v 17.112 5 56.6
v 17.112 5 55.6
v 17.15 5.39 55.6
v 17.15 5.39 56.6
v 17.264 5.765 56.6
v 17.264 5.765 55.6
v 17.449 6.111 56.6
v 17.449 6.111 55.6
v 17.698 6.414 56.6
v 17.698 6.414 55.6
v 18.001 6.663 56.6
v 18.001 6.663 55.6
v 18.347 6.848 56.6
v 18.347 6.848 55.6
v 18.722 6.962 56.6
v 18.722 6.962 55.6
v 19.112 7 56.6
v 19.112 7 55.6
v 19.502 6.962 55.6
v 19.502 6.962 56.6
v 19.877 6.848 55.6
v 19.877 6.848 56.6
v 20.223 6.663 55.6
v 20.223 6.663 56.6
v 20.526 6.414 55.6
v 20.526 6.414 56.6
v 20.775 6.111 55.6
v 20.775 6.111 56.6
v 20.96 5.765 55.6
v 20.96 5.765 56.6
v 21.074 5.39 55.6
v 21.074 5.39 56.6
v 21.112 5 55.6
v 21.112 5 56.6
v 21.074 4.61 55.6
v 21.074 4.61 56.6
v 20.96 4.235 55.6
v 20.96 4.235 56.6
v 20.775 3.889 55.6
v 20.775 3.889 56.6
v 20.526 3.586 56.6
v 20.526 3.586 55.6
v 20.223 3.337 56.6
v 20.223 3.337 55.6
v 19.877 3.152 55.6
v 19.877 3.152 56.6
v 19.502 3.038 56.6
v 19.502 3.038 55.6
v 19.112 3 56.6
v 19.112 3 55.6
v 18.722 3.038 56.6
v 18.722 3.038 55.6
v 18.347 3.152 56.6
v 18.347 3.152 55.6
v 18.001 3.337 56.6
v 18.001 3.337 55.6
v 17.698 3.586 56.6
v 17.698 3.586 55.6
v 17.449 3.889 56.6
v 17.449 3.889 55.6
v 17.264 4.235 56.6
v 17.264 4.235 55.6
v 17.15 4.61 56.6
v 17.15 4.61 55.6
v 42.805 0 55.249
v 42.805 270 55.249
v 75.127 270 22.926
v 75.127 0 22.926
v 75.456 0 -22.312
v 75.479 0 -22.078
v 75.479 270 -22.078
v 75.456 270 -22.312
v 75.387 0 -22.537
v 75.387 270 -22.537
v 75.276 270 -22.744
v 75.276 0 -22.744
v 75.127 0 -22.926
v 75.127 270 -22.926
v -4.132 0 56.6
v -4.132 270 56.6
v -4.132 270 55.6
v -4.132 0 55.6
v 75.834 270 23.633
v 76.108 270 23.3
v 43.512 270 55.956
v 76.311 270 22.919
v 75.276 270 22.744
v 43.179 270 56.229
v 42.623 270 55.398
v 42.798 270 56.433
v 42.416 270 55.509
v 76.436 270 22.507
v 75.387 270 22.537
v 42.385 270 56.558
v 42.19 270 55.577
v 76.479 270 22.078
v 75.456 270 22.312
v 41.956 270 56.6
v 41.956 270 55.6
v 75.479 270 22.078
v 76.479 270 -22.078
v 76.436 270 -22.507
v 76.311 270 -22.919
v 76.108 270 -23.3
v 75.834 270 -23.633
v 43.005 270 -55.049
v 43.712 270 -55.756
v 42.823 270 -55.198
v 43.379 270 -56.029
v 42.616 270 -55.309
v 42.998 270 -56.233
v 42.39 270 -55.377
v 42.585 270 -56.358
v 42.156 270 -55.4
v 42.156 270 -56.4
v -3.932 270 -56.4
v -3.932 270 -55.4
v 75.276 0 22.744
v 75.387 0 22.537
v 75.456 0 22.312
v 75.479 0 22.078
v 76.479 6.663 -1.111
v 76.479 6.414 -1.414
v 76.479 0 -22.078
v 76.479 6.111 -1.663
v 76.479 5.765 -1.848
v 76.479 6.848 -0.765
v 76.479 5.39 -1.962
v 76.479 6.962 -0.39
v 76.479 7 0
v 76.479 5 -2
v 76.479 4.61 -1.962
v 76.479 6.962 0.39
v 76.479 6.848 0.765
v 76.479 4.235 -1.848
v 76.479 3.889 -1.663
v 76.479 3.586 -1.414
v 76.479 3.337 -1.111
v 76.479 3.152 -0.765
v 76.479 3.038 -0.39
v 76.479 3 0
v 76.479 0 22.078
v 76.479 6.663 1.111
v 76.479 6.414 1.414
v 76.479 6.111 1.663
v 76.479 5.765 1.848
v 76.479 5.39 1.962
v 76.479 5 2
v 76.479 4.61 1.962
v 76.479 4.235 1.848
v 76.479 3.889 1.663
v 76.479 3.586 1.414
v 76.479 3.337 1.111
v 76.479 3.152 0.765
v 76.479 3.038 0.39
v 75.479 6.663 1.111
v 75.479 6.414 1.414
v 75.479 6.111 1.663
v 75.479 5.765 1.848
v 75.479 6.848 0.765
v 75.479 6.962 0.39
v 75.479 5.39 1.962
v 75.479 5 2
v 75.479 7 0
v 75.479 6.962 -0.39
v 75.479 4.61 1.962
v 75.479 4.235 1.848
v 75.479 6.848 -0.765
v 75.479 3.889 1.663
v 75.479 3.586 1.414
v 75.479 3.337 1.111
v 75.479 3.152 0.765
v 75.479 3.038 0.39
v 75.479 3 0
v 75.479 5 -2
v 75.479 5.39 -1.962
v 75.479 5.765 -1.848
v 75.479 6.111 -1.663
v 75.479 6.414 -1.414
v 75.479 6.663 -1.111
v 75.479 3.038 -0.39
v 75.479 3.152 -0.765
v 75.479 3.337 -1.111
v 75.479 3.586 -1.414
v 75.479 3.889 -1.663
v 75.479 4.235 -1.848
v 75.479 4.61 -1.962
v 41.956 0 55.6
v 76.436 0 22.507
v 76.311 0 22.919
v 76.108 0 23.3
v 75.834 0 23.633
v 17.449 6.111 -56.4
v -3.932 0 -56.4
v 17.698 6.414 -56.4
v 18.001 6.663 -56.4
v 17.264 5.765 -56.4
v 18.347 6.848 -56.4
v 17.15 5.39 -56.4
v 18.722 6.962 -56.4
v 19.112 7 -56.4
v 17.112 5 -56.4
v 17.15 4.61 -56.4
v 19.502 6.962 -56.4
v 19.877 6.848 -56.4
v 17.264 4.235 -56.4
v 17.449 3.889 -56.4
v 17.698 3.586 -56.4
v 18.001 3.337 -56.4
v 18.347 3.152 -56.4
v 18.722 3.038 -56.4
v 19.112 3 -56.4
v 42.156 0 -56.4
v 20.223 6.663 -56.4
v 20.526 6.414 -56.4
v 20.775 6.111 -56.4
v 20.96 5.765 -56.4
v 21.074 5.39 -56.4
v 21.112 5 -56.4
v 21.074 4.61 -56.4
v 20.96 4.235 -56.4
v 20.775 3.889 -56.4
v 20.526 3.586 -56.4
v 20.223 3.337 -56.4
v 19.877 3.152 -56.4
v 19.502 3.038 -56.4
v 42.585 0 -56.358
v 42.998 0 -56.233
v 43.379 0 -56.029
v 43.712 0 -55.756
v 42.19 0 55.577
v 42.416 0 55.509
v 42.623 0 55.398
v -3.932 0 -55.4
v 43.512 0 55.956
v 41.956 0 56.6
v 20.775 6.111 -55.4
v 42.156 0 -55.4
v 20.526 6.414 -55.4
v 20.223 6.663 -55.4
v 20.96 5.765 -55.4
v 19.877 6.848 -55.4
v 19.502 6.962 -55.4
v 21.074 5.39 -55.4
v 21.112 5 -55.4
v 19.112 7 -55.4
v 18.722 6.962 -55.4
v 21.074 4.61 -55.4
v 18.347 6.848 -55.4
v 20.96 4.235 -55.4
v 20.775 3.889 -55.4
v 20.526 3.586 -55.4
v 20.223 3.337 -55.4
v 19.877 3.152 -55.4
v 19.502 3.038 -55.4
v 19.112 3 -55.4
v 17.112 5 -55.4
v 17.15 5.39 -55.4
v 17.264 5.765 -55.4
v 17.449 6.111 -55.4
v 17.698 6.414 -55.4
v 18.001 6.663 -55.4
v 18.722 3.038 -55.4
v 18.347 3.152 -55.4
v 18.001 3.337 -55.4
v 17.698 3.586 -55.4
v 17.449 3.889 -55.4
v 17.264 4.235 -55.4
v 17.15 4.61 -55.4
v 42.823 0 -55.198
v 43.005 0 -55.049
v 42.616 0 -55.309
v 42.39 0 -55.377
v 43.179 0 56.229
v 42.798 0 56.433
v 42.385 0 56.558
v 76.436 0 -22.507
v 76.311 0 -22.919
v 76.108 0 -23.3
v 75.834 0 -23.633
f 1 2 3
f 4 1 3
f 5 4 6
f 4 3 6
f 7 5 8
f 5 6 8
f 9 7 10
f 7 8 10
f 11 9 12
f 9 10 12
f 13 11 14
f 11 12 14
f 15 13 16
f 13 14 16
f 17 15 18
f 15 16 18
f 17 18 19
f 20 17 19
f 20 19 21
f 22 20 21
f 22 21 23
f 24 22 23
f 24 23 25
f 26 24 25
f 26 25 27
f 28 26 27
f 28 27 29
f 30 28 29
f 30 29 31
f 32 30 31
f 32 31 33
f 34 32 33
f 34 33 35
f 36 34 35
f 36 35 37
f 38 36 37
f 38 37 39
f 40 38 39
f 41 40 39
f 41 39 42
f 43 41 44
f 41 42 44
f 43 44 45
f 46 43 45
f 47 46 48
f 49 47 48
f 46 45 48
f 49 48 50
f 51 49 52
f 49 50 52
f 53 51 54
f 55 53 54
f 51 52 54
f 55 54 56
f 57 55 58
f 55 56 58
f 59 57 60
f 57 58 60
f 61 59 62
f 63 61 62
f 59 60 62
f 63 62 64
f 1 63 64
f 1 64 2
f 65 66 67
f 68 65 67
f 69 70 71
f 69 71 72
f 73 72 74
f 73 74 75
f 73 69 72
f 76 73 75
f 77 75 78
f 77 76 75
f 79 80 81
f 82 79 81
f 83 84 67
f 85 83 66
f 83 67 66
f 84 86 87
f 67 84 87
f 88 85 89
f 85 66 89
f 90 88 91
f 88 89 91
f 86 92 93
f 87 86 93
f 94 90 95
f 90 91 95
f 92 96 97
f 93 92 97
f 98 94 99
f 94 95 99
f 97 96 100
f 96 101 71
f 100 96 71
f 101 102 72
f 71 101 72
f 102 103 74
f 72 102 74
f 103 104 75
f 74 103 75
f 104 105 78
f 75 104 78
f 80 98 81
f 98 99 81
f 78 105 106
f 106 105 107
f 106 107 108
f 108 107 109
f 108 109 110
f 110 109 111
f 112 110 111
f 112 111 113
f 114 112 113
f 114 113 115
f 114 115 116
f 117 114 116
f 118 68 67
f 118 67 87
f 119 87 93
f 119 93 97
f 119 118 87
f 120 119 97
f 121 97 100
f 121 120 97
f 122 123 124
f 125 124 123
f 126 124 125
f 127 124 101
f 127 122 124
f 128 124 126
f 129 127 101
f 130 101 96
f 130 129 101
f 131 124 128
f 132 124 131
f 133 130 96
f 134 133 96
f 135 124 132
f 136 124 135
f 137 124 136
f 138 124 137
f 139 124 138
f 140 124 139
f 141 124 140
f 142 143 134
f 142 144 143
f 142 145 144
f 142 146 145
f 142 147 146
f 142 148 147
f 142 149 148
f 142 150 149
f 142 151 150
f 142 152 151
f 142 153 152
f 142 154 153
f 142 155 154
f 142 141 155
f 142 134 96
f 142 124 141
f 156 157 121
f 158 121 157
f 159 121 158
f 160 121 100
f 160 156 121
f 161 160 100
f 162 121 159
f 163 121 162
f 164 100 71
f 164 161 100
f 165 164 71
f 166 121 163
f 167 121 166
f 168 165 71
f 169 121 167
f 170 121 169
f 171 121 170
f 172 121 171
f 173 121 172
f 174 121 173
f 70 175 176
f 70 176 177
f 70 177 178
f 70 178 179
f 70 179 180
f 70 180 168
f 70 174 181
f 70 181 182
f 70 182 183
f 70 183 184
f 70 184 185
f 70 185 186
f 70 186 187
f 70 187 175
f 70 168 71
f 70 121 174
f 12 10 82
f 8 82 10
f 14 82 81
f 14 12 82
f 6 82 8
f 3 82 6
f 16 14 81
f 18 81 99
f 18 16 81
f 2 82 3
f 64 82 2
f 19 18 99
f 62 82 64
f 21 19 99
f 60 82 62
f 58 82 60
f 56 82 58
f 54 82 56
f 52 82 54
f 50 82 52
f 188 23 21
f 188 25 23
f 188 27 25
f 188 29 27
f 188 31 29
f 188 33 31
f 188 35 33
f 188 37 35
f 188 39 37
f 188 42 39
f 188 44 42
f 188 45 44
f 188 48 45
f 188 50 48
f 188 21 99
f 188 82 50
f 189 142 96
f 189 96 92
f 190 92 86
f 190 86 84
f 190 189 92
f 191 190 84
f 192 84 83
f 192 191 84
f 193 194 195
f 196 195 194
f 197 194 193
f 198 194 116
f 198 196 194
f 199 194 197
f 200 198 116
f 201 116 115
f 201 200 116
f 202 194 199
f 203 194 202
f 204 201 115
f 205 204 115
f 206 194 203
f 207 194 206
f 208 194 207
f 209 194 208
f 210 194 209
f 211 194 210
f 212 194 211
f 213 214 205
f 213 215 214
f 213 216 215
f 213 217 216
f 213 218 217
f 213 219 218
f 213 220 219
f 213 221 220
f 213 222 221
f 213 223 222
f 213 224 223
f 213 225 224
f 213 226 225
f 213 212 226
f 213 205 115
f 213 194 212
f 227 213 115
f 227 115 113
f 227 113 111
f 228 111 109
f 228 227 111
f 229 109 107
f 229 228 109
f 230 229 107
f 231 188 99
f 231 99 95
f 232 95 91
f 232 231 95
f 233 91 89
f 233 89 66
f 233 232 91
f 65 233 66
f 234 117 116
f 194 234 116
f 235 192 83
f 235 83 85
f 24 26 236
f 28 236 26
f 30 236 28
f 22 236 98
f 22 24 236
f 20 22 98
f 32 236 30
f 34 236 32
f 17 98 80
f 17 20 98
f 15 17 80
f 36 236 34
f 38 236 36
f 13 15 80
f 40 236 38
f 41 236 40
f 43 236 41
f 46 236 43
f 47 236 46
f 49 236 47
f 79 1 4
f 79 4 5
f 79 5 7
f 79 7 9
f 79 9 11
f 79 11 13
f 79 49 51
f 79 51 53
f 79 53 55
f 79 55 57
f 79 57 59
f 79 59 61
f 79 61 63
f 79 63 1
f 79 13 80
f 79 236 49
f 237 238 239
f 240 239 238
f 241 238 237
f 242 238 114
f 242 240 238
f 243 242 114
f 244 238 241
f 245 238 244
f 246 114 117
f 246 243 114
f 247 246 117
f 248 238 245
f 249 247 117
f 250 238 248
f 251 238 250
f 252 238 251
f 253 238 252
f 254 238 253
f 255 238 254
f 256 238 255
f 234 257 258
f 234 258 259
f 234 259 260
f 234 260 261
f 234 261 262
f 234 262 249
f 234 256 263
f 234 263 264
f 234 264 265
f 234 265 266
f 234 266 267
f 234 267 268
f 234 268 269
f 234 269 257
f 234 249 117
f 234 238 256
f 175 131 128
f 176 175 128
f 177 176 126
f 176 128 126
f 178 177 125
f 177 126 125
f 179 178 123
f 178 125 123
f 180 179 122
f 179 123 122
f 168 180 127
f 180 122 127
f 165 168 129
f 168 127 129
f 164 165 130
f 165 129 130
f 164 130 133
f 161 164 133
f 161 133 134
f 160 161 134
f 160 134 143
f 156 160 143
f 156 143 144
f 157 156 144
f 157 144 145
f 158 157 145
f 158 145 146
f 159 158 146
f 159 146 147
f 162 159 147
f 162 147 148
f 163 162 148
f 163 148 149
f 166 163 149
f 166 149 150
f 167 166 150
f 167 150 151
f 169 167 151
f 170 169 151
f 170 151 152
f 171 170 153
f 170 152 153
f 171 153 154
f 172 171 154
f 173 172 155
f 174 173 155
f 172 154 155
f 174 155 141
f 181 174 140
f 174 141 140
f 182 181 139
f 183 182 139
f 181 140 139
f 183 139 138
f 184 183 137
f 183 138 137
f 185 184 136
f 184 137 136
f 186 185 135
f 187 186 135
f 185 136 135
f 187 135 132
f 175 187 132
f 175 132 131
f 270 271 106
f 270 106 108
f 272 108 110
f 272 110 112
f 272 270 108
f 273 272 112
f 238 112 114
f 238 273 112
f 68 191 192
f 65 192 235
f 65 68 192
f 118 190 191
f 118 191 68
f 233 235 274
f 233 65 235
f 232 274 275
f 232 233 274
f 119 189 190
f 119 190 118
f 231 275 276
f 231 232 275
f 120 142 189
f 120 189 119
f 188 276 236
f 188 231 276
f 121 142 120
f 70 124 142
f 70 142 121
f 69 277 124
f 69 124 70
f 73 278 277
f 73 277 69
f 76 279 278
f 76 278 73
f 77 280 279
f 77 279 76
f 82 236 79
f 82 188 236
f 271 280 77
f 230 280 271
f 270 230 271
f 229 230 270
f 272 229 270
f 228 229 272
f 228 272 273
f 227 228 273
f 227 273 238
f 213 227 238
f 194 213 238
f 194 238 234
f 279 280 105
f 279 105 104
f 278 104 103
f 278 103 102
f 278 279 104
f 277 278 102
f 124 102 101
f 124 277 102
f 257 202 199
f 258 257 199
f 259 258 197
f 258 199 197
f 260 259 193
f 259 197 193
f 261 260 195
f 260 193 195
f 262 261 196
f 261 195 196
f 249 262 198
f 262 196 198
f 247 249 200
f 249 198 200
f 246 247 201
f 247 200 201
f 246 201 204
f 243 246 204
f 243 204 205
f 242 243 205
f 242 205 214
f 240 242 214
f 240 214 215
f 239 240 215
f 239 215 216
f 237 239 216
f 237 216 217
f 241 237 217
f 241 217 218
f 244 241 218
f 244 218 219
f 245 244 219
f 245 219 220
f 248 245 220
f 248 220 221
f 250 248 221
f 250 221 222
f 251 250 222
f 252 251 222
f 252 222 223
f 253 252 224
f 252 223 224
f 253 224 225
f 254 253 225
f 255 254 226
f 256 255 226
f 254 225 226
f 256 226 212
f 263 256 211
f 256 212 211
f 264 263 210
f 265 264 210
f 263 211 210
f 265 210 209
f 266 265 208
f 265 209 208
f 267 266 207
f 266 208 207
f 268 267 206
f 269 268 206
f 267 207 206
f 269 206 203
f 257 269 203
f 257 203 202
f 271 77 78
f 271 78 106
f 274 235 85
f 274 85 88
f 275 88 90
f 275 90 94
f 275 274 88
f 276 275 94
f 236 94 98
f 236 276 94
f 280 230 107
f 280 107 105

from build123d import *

# Parameters (mm, degrees)
SM_BASE_FLANGE_1_DEPTH = 270
SKETCH_2_R             = 2
CUT_EXTRUDE_1_DEPTH    = 137
SKETCH_3_R             = 2
CUT_EXTRUDE_2_DEPTH    = 10


# Sheet-metal steps are written as plain solids
with BuildPart() as part:
    # Sketch 1 → Базовая кромка1 (new body)
    with BuildSketch(Plane(origin=(0, 0, 0), x_dir=(1, 0, 0), z_dir=(0, 1, 0))):
        with BuildLine():
            Line((-3.932431311, 56.4), (42.156298852, 56.4))
            ThreePointArc((42.156298852, 56.4), (42.998202403, 56.232534972), (43.71193377, 55.755634919))
            Line((43.71193377, 55.755634919), (75.834350896, 23.633217793))
            ThreePointArc((75.834350896, 23.633217793), (76.311250949, 22.919486426), (76.478715977, 22.077582874))
            Line((76.478715977, 22.077582874), (76.478715977, -22.077582874))
            ThreePointArc((76.478715977, -22.077582874), (76.311250949, -22.919486426), (75.834350896, -23.633217793))
            Line((75.834350896, -23.633217793), (43.51193377, -55.955634919))
            ThreePointArc((43.51193377, -55.955634919), (42.798202403, -56.432534972), (41.956298852, -56.6))
            Line((41.956298852, -56.6), (-4.132431311, -56.6))
            Line((-4.132431311, -56.6), (-4.132431311, -55.6))
            Line((-4.132431311, -55.6), (41.956298852, -55.6))
            ThreePointArc((41.956298852, -55.6), (42.41551897, -55.508655439), (42.804826989, -55.248528137))
            Line((42.804826989, -55.248528137), (75.127244115, -22.926111012))
            ThreePointArc((75.127244115, -22.926111012), (75.387371416, -22.536802993), (75.478715977, -22.077582874))
            Line((75.478715977, -22.077582874), (75.478715977, 22.077582874))
            ThreePointArc((75.478715977, 22.077582874), (75.387371416, 22.536802993), (75.127244115, 22.926111012))
            Line((75.127244115, 22.926111012), (43.004826989, 55.048528137))
            ThreePointArc((43.004826989, 55.048528137), (42.61551897, 55.308655439), (42.156298852, 55.4))
            Line((42.156298852, 55.4), (-3.932431311, 55.4))
            Line((-3.932431311, 55.4), (-3.932431311, 56.4))
        make_face()
    extrude(amount=SM_BASE_FLANGE_1_DEPTH)

    # Эскиз2 → Вырез-Вытянуть1 (cut)
    with BuildSketch(Plane(origin=(0, 0, -56.4), x_dir=(-1, 0, 0), z_dir=(0, 0, -1))):
        with Locations((-19.11193377, 5)):
            Circle(SKETCH_2_R)
    extrude(amount=-CUT_EXTRUDE_1_DEPTH, mode=Mode.SUBTRACT)

    # Эскиз3 → Вырез-Вытянуть2 (cut)
    with BuildSketch(Plane(origin=(76.478715977, 0, 0), x_dir=(0, 0, -1), z_dir=(1, 0, 0))):
        with Locations((0, 5)):
            Circle(SKETCH_3_R)
    extrude(amount=-CUT_EXTRUDE_2_DEPTH, mode=Mode.SUBTRACT)


solid = part.part
